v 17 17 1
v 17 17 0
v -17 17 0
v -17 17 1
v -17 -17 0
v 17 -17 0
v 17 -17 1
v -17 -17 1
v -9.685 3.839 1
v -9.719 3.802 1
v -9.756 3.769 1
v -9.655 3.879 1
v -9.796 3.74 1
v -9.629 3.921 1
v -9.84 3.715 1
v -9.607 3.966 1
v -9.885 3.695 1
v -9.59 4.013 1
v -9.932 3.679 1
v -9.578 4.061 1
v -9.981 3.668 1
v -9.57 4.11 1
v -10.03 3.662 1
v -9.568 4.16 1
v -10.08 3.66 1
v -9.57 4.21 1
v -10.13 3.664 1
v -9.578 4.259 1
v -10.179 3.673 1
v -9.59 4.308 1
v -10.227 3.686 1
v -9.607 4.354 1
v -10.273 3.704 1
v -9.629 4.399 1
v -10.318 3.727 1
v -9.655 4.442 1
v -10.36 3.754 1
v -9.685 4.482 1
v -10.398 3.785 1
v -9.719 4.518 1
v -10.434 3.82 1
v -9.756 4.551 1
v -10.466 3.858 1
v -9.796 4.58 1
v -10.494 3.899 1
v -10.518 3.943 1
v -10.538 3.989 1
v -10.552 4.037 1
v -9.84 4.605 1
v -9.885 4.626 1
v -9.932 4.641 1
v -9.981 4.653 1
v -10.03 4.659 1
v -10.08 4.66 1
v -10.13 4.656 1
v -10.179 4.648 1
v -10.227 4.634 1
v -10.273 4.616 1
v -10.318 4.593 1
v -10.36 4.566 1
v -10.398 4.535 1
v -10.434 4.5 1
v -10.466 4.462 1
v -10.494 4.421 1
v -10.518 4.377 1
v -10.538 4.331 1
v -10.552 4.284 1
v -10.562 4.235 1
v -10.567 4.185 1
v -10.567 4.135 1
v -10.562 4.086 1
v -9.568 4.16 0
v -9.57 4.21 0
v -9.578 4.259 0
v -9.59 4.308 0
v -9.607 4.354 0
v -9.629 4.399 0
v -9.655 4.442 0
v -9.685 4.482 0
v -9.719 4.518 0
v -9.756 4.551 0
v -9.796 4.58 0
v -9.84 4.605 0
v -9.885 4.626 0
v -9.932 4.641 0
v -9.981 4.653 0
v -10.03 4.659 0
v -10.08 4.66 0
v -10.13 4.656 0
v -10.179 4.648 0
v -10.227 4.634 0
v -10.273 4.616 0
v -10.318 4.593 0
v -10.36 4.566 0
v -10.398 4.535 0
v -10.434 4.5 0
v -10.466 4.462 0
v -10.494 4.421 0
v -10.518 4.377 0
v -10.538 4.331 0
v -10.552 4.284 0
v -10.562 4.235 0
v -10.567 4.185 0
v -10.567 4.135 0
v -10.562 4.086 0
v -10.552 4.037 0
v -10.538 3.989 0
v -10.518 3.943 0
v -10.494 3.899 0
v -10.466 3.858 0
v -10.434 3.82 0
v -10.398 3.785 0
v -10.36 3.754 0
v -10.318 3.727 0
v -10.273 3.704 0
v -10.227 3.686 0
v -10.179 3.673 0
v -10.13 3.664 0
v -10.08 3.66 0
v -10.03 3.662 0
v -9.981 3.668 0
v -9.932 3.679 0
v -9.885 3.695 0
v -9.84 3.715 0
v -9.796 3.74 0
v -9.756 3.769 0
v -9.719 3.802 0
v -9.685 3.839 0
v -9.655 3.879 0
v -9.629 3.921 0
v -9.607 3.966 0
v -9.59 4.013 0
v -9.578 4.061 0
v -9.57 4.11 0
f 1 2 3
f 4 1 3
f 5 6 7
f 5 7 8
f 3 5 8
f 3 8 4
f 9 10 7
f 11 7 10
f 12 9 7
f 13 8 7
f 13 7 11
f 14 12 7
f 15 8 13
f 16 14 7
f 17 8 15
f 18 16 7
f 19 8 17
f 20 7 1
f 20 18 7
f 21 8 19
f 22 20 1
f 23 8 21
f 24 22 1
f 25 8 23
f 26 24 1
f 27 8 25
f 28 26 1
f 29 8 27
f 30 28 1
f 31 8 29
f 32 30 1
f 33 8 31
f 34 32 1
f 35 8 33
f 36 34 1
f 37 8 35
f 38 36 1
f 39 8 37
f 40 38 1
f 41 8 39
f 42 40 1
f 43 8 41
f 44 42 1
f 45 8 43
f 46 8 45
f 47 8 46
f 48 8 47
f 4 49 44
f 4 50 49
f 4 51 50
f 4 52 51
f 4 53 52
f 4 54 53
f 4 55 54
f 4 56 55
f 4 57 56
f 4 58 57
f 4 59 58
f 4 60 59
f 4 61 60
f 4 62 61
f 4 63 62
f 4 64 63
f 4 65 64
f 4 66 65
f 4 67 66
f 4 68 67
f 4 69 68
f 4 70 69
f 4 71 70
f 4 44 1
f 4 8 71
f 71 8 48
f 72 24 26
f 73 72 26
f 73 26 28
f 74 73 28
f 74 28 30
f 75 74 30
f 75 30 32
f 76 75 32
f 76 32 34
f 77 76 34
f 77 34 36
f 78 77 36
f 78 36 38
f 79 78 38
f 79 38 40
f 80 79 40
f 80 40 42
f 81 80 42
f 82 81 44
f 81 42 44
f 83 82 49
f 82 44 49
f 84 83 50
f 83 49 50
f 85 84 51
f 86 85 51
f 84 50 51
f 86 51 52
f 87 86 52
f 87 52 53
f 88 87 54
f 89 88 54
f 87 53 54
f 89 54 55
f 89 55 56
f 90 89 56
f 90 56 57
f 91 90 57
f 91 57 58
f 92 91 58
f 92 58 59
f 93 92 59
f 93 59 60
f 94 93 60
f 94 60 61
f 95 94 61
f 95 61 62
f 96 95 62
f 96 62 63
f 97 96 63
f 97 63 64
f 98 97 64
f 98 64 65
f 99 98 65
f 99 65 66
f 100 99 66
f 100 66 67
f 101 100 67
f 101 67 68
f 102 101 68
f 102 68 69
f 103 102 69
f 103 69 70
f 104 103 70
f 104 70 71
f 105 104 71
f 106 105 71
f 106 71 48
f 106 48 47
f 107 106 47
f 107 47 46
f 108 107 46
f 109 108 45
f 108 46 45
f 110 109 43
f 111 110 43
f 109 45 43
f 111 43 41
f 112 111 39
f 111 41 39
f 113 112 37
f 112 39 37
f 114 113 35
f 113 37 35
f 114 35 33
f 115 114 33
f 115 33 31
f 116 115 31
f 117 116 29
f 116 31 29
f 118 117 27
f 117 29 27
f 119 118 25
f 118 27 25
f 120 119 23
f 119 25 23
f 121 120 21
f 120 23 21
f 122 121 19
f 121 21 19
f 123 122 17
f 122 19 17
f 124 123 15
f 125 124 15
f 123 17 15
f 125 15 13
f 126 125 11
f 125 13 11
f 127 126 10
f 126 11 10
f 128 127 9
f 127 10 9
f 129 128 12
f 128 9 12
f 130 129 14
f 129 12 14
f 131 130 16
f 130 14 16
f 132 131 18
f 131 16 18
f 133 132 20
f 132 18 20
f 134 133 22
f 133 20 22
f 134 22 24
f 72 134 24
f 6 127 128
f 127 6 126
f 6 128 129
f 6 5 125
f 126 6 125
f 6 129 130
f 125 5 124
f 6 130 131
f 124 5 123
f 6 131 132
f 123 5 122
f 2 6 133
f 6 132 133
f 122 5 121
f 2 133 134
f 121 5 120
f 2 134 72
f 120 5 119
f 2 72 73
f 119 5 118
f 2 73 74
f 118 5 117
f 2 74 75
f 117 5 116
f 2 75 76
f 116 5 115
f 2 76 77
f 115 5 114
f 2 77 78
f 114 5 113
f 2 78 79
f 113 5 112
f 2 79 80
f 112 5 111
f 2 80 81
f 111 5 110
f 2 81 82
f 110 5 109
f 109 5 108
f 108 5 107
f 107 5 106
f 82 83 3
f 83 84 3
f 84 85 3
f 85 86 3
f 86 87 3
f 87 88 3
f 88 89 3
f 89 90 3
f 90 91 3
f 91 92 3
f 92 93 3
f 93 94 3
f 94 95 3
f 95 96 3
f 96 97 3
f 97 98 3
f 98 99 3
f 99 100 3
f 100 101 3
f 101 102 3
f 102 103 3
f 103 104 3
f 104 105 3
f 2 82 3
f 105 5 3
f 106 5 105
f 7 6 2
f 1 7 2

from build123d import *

# Parameters (mm, degrees)
ESQUISSE3_W             = 34
ESQUISSE3_H             = 34
BOSS_EXTRU_1_DEPTH      = 1
SKETCH_HOLES_R          = 0.5
CUT_EXTRUDE_HOLES_DEPTH = 2


with BuildPart() as part:
    # Esquisse3 → Boss.-Extru.1 (new body)
    with BuildSketch(Plane(origin=(0, 0, 0), x_dir=(0, 1, 0), z_dir=(0, 0, 1))):
        Rectangle(ESQUISSE3_W, ESQUISSE3_H)
    extrude(amount=BOSS_EXTRU_1_DEPTH)

    # Sketch_Holes → Cut_Extrude_Holes (cut, through all)
    with BuildSketch(Plane.XY.offset(1)):
        with Locations((-10.067654011, 4.160184375)):
            Circle(SKETCH_HOLES_R)
    extrude(amount=-CUT_EXTRUDE_HOLES_DEPTH, mode=Mode.SUBTRACT)


solid = part.part
